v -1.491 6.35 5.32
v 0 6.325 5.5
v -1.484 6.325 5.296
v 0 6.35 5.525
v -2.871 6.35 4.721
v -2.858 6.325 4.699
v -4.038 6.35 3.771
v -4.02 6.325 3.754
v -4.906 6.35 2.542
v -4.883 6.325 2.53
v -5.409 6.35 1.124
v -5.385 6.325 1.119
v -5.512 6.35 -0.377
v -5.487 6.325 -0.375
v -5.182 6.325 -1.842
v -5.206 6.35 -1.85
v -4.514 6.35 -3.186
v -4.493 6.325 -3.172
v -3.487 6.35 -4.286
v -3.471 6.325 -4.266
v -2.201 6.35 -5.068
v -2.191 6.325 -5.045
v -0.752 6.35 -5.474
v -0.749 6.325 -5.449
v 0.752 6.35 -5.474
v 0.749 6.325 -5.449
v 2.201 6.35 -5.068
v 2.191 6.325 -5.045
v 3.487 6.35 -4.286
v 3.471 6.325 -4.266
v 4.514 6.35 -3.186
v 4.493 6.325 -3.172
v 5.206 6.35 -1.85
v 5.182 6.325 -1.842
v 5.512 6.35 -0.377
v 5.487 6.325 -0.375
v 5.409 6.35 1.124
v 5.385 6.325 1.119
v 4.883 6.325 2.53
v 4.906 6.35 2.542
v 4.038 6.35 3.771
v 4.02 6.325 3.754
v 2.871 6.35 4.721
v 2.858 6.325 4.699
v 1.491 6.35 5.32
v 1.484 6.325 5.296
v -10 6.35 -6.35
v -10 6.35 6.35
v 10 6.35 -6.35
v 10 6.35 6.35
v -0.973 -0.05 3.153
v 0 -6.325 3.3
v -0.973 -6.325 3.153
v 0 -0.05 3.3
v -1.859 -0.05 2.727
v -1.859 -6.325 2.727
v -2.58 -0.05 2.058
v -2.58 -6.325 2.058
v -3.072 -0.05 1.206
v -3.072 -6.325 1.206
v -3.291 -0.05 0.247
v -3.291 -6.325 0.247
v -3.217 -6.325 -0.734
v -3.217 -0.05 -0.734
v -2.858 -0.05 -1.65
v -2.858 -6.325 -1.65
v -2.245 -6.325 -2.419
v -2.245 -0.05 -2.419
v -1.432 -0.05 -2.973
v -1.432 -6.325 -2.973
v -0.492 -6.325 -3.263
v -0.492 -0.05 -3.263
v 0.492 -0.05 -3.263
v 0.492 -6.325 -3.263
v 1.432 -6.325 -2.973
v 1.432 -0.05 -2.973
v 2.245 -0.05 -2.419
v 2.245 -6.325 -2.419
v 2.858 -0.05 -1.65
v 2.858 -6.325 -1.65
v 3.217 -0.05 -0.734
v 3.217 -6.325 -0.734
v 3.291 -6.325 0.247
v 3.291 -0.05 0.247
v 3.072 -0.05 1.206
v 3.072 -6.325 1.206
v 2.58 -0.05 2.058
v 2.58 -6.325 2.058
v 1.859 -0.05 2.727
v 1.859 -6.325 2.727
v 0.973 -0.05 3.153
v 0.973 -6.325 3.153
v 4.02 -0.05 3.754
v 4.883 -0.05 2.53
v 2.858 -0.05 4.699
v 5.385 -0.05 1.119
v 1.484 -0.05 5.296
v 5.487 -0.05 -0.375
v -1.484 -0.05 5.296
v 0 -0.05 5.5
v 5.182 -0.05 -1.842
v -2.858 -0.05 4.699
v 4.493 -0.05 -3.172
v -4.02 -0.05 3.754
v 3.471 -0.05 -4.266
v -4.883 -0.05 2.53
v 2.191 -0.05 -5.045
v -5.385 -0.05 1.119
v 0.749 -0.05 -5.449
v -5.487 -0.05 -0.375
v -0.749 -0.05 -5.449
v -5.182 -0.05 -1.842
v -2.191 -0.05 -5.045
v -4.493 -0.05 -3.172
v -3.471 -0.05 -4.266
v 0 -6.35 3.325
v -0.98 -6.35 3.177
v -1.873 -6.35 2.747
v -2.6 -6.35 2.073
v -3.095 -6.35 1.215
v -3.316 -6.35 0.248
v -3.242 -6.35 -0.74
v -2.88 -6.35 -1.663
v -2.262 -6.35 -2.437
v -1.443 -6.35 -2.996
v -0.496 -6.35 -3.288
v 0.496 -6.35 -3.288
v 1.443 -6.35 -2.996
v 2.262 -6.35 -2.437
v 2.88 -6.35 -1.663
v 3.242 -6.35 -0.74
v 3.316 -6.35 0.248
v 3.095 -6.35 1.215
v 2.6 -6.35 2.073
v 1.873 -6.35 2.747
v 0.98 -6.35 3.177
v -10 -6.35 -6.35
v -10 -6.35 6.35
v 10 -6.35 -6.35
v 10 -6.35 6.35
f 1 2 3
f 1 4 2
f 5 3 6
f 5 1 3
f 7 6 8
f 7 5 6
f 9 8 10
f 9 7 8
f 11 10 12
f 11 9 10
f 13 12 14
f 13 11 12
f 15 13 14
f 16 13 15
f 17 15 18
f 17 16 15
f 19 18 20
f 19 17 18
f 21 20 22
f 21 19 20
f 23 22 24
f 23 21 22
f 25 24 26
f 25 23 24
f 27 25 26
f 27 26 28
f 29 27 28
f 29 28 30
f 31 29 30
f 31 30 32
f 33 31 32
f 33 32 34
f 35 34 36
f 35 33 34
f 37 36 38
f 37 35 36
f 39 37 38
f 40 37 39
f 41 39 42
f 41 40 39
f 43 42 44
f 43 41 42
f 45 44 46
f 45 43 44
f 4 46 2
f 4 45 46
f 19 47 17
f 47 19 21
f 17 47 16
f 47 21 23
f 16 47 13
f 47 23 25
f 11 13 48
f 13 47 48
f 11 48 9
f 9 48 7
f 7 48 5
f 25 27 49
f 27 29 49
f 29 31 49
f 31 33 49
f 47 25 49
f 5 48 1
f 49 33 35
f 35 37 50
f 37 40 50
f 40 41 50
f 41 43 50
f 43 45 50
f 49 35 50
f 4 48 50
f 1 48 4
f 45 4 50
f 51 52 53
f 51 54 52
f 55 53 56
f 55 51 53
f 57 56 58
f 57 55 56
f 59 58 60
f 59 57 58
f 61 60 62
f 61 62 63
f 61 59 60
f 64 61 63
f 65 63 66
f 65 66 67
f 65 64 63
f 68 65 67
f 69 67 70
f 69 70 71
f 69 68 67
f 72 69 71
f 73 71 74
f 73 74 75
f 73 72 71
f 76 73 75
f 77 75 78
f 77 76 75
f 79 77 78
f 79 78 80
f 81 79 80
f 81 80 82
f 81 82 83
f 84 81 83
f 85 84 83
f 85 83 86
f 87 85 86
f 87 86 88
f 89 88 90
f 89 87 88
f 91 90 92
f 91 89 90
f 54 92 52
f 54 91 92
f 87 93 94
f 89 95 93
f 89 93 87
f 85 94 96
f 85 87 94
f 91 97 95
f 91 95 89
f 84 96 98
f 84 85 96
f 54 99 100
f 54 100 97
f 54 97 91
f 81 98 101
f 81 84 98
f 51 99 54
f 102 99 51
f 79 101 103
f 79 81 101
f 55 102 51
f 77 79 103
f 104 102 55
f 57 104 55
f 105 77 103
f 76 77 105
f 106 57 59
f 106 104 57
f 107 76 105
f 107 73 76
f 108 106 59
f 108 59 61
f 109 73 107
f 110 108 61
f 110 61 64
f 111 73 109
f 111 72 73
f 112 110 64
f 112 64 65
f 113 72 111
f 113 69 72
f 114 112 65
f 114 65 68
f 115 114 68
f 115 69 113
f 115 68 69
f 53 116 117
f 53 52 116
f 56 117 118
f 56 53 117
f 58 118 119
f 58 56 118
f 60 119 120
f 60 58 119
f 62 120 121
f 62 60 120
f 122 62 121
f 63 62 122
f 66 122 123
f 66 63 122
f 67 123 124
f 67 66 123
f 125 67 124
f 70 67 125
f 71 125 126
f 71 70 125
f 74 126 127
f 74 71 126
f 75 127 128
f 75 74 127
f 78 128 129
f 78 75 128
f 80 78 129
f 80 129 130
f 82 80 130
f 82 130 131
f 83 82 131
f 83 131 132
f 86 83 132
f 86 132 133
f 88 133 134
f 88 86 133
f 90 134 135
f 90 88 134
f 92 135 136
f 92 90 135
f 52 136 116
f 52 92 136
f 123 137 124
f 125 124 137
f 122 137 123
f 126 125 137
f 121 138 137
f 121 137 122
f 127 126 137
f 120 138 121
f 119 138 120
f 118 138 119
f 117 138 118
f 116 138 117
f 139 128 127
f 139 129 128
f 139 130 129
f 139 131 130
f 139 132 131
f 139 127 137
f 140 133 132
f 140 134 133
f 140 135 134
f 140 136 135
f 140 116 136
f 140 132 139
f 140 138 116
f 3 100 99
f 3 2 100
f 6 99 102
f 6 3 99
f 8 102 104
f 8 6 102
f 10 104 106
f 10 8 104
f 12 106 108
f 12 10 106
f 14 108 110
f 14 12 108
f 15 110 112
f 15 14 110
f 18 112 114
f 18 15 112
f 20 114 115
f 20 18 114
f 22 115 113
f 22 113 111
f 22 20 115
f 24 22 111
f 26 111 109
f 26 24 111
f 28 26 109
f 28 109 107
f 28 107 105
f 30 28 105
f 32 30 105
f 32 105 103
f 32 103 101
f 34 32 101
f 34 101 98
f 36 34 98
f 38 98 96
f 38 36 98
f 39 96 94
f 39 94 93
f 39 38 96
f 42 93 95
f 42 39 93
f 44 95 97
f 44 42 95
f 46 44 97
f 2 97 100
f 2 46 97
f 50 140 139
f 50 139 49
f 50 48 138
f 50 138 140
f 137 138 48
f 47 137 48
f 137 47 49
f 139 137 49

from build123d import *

# Parameters (mm, degrees)
CROQUIS1_W              = 20
CROQUIS1_H              = 12.7
SALIENTE_EXTRUIR1_DEPTH = 6.35


with BuildPart() as part:
    # Croquis1 → Saliente-Extruir1 (new, symmetric)
    with BuildSketch(Plane.XY):
        Rectangle(CROQUIS1_W, CROQUIS1_H)
    extrude(amount=SALIENTE_EXTRUIR1_DEPTH, both=True)

    # Croquis3 → Refrentado para tornillo con cabeza hueca de M61 (revolve, cut)
    with BuildSketch(Plane(origin=(0, 6.35, 0), x_dir=(0, 0, 1), z_dir=(1, 0, 0))):
        Polygon((0, 0), (0, 12.7), (3.325, 12.7), (3.3, 12.675), (3.3, 6.4), (5.5, 6.4), (5.5, 0.025), (5.525, 0), align=None)
    revolve(axis=Axis((0, 12.7, 0), (0, -1, 0)), mode=Mode.SUBTRACT)


solid = part.part
